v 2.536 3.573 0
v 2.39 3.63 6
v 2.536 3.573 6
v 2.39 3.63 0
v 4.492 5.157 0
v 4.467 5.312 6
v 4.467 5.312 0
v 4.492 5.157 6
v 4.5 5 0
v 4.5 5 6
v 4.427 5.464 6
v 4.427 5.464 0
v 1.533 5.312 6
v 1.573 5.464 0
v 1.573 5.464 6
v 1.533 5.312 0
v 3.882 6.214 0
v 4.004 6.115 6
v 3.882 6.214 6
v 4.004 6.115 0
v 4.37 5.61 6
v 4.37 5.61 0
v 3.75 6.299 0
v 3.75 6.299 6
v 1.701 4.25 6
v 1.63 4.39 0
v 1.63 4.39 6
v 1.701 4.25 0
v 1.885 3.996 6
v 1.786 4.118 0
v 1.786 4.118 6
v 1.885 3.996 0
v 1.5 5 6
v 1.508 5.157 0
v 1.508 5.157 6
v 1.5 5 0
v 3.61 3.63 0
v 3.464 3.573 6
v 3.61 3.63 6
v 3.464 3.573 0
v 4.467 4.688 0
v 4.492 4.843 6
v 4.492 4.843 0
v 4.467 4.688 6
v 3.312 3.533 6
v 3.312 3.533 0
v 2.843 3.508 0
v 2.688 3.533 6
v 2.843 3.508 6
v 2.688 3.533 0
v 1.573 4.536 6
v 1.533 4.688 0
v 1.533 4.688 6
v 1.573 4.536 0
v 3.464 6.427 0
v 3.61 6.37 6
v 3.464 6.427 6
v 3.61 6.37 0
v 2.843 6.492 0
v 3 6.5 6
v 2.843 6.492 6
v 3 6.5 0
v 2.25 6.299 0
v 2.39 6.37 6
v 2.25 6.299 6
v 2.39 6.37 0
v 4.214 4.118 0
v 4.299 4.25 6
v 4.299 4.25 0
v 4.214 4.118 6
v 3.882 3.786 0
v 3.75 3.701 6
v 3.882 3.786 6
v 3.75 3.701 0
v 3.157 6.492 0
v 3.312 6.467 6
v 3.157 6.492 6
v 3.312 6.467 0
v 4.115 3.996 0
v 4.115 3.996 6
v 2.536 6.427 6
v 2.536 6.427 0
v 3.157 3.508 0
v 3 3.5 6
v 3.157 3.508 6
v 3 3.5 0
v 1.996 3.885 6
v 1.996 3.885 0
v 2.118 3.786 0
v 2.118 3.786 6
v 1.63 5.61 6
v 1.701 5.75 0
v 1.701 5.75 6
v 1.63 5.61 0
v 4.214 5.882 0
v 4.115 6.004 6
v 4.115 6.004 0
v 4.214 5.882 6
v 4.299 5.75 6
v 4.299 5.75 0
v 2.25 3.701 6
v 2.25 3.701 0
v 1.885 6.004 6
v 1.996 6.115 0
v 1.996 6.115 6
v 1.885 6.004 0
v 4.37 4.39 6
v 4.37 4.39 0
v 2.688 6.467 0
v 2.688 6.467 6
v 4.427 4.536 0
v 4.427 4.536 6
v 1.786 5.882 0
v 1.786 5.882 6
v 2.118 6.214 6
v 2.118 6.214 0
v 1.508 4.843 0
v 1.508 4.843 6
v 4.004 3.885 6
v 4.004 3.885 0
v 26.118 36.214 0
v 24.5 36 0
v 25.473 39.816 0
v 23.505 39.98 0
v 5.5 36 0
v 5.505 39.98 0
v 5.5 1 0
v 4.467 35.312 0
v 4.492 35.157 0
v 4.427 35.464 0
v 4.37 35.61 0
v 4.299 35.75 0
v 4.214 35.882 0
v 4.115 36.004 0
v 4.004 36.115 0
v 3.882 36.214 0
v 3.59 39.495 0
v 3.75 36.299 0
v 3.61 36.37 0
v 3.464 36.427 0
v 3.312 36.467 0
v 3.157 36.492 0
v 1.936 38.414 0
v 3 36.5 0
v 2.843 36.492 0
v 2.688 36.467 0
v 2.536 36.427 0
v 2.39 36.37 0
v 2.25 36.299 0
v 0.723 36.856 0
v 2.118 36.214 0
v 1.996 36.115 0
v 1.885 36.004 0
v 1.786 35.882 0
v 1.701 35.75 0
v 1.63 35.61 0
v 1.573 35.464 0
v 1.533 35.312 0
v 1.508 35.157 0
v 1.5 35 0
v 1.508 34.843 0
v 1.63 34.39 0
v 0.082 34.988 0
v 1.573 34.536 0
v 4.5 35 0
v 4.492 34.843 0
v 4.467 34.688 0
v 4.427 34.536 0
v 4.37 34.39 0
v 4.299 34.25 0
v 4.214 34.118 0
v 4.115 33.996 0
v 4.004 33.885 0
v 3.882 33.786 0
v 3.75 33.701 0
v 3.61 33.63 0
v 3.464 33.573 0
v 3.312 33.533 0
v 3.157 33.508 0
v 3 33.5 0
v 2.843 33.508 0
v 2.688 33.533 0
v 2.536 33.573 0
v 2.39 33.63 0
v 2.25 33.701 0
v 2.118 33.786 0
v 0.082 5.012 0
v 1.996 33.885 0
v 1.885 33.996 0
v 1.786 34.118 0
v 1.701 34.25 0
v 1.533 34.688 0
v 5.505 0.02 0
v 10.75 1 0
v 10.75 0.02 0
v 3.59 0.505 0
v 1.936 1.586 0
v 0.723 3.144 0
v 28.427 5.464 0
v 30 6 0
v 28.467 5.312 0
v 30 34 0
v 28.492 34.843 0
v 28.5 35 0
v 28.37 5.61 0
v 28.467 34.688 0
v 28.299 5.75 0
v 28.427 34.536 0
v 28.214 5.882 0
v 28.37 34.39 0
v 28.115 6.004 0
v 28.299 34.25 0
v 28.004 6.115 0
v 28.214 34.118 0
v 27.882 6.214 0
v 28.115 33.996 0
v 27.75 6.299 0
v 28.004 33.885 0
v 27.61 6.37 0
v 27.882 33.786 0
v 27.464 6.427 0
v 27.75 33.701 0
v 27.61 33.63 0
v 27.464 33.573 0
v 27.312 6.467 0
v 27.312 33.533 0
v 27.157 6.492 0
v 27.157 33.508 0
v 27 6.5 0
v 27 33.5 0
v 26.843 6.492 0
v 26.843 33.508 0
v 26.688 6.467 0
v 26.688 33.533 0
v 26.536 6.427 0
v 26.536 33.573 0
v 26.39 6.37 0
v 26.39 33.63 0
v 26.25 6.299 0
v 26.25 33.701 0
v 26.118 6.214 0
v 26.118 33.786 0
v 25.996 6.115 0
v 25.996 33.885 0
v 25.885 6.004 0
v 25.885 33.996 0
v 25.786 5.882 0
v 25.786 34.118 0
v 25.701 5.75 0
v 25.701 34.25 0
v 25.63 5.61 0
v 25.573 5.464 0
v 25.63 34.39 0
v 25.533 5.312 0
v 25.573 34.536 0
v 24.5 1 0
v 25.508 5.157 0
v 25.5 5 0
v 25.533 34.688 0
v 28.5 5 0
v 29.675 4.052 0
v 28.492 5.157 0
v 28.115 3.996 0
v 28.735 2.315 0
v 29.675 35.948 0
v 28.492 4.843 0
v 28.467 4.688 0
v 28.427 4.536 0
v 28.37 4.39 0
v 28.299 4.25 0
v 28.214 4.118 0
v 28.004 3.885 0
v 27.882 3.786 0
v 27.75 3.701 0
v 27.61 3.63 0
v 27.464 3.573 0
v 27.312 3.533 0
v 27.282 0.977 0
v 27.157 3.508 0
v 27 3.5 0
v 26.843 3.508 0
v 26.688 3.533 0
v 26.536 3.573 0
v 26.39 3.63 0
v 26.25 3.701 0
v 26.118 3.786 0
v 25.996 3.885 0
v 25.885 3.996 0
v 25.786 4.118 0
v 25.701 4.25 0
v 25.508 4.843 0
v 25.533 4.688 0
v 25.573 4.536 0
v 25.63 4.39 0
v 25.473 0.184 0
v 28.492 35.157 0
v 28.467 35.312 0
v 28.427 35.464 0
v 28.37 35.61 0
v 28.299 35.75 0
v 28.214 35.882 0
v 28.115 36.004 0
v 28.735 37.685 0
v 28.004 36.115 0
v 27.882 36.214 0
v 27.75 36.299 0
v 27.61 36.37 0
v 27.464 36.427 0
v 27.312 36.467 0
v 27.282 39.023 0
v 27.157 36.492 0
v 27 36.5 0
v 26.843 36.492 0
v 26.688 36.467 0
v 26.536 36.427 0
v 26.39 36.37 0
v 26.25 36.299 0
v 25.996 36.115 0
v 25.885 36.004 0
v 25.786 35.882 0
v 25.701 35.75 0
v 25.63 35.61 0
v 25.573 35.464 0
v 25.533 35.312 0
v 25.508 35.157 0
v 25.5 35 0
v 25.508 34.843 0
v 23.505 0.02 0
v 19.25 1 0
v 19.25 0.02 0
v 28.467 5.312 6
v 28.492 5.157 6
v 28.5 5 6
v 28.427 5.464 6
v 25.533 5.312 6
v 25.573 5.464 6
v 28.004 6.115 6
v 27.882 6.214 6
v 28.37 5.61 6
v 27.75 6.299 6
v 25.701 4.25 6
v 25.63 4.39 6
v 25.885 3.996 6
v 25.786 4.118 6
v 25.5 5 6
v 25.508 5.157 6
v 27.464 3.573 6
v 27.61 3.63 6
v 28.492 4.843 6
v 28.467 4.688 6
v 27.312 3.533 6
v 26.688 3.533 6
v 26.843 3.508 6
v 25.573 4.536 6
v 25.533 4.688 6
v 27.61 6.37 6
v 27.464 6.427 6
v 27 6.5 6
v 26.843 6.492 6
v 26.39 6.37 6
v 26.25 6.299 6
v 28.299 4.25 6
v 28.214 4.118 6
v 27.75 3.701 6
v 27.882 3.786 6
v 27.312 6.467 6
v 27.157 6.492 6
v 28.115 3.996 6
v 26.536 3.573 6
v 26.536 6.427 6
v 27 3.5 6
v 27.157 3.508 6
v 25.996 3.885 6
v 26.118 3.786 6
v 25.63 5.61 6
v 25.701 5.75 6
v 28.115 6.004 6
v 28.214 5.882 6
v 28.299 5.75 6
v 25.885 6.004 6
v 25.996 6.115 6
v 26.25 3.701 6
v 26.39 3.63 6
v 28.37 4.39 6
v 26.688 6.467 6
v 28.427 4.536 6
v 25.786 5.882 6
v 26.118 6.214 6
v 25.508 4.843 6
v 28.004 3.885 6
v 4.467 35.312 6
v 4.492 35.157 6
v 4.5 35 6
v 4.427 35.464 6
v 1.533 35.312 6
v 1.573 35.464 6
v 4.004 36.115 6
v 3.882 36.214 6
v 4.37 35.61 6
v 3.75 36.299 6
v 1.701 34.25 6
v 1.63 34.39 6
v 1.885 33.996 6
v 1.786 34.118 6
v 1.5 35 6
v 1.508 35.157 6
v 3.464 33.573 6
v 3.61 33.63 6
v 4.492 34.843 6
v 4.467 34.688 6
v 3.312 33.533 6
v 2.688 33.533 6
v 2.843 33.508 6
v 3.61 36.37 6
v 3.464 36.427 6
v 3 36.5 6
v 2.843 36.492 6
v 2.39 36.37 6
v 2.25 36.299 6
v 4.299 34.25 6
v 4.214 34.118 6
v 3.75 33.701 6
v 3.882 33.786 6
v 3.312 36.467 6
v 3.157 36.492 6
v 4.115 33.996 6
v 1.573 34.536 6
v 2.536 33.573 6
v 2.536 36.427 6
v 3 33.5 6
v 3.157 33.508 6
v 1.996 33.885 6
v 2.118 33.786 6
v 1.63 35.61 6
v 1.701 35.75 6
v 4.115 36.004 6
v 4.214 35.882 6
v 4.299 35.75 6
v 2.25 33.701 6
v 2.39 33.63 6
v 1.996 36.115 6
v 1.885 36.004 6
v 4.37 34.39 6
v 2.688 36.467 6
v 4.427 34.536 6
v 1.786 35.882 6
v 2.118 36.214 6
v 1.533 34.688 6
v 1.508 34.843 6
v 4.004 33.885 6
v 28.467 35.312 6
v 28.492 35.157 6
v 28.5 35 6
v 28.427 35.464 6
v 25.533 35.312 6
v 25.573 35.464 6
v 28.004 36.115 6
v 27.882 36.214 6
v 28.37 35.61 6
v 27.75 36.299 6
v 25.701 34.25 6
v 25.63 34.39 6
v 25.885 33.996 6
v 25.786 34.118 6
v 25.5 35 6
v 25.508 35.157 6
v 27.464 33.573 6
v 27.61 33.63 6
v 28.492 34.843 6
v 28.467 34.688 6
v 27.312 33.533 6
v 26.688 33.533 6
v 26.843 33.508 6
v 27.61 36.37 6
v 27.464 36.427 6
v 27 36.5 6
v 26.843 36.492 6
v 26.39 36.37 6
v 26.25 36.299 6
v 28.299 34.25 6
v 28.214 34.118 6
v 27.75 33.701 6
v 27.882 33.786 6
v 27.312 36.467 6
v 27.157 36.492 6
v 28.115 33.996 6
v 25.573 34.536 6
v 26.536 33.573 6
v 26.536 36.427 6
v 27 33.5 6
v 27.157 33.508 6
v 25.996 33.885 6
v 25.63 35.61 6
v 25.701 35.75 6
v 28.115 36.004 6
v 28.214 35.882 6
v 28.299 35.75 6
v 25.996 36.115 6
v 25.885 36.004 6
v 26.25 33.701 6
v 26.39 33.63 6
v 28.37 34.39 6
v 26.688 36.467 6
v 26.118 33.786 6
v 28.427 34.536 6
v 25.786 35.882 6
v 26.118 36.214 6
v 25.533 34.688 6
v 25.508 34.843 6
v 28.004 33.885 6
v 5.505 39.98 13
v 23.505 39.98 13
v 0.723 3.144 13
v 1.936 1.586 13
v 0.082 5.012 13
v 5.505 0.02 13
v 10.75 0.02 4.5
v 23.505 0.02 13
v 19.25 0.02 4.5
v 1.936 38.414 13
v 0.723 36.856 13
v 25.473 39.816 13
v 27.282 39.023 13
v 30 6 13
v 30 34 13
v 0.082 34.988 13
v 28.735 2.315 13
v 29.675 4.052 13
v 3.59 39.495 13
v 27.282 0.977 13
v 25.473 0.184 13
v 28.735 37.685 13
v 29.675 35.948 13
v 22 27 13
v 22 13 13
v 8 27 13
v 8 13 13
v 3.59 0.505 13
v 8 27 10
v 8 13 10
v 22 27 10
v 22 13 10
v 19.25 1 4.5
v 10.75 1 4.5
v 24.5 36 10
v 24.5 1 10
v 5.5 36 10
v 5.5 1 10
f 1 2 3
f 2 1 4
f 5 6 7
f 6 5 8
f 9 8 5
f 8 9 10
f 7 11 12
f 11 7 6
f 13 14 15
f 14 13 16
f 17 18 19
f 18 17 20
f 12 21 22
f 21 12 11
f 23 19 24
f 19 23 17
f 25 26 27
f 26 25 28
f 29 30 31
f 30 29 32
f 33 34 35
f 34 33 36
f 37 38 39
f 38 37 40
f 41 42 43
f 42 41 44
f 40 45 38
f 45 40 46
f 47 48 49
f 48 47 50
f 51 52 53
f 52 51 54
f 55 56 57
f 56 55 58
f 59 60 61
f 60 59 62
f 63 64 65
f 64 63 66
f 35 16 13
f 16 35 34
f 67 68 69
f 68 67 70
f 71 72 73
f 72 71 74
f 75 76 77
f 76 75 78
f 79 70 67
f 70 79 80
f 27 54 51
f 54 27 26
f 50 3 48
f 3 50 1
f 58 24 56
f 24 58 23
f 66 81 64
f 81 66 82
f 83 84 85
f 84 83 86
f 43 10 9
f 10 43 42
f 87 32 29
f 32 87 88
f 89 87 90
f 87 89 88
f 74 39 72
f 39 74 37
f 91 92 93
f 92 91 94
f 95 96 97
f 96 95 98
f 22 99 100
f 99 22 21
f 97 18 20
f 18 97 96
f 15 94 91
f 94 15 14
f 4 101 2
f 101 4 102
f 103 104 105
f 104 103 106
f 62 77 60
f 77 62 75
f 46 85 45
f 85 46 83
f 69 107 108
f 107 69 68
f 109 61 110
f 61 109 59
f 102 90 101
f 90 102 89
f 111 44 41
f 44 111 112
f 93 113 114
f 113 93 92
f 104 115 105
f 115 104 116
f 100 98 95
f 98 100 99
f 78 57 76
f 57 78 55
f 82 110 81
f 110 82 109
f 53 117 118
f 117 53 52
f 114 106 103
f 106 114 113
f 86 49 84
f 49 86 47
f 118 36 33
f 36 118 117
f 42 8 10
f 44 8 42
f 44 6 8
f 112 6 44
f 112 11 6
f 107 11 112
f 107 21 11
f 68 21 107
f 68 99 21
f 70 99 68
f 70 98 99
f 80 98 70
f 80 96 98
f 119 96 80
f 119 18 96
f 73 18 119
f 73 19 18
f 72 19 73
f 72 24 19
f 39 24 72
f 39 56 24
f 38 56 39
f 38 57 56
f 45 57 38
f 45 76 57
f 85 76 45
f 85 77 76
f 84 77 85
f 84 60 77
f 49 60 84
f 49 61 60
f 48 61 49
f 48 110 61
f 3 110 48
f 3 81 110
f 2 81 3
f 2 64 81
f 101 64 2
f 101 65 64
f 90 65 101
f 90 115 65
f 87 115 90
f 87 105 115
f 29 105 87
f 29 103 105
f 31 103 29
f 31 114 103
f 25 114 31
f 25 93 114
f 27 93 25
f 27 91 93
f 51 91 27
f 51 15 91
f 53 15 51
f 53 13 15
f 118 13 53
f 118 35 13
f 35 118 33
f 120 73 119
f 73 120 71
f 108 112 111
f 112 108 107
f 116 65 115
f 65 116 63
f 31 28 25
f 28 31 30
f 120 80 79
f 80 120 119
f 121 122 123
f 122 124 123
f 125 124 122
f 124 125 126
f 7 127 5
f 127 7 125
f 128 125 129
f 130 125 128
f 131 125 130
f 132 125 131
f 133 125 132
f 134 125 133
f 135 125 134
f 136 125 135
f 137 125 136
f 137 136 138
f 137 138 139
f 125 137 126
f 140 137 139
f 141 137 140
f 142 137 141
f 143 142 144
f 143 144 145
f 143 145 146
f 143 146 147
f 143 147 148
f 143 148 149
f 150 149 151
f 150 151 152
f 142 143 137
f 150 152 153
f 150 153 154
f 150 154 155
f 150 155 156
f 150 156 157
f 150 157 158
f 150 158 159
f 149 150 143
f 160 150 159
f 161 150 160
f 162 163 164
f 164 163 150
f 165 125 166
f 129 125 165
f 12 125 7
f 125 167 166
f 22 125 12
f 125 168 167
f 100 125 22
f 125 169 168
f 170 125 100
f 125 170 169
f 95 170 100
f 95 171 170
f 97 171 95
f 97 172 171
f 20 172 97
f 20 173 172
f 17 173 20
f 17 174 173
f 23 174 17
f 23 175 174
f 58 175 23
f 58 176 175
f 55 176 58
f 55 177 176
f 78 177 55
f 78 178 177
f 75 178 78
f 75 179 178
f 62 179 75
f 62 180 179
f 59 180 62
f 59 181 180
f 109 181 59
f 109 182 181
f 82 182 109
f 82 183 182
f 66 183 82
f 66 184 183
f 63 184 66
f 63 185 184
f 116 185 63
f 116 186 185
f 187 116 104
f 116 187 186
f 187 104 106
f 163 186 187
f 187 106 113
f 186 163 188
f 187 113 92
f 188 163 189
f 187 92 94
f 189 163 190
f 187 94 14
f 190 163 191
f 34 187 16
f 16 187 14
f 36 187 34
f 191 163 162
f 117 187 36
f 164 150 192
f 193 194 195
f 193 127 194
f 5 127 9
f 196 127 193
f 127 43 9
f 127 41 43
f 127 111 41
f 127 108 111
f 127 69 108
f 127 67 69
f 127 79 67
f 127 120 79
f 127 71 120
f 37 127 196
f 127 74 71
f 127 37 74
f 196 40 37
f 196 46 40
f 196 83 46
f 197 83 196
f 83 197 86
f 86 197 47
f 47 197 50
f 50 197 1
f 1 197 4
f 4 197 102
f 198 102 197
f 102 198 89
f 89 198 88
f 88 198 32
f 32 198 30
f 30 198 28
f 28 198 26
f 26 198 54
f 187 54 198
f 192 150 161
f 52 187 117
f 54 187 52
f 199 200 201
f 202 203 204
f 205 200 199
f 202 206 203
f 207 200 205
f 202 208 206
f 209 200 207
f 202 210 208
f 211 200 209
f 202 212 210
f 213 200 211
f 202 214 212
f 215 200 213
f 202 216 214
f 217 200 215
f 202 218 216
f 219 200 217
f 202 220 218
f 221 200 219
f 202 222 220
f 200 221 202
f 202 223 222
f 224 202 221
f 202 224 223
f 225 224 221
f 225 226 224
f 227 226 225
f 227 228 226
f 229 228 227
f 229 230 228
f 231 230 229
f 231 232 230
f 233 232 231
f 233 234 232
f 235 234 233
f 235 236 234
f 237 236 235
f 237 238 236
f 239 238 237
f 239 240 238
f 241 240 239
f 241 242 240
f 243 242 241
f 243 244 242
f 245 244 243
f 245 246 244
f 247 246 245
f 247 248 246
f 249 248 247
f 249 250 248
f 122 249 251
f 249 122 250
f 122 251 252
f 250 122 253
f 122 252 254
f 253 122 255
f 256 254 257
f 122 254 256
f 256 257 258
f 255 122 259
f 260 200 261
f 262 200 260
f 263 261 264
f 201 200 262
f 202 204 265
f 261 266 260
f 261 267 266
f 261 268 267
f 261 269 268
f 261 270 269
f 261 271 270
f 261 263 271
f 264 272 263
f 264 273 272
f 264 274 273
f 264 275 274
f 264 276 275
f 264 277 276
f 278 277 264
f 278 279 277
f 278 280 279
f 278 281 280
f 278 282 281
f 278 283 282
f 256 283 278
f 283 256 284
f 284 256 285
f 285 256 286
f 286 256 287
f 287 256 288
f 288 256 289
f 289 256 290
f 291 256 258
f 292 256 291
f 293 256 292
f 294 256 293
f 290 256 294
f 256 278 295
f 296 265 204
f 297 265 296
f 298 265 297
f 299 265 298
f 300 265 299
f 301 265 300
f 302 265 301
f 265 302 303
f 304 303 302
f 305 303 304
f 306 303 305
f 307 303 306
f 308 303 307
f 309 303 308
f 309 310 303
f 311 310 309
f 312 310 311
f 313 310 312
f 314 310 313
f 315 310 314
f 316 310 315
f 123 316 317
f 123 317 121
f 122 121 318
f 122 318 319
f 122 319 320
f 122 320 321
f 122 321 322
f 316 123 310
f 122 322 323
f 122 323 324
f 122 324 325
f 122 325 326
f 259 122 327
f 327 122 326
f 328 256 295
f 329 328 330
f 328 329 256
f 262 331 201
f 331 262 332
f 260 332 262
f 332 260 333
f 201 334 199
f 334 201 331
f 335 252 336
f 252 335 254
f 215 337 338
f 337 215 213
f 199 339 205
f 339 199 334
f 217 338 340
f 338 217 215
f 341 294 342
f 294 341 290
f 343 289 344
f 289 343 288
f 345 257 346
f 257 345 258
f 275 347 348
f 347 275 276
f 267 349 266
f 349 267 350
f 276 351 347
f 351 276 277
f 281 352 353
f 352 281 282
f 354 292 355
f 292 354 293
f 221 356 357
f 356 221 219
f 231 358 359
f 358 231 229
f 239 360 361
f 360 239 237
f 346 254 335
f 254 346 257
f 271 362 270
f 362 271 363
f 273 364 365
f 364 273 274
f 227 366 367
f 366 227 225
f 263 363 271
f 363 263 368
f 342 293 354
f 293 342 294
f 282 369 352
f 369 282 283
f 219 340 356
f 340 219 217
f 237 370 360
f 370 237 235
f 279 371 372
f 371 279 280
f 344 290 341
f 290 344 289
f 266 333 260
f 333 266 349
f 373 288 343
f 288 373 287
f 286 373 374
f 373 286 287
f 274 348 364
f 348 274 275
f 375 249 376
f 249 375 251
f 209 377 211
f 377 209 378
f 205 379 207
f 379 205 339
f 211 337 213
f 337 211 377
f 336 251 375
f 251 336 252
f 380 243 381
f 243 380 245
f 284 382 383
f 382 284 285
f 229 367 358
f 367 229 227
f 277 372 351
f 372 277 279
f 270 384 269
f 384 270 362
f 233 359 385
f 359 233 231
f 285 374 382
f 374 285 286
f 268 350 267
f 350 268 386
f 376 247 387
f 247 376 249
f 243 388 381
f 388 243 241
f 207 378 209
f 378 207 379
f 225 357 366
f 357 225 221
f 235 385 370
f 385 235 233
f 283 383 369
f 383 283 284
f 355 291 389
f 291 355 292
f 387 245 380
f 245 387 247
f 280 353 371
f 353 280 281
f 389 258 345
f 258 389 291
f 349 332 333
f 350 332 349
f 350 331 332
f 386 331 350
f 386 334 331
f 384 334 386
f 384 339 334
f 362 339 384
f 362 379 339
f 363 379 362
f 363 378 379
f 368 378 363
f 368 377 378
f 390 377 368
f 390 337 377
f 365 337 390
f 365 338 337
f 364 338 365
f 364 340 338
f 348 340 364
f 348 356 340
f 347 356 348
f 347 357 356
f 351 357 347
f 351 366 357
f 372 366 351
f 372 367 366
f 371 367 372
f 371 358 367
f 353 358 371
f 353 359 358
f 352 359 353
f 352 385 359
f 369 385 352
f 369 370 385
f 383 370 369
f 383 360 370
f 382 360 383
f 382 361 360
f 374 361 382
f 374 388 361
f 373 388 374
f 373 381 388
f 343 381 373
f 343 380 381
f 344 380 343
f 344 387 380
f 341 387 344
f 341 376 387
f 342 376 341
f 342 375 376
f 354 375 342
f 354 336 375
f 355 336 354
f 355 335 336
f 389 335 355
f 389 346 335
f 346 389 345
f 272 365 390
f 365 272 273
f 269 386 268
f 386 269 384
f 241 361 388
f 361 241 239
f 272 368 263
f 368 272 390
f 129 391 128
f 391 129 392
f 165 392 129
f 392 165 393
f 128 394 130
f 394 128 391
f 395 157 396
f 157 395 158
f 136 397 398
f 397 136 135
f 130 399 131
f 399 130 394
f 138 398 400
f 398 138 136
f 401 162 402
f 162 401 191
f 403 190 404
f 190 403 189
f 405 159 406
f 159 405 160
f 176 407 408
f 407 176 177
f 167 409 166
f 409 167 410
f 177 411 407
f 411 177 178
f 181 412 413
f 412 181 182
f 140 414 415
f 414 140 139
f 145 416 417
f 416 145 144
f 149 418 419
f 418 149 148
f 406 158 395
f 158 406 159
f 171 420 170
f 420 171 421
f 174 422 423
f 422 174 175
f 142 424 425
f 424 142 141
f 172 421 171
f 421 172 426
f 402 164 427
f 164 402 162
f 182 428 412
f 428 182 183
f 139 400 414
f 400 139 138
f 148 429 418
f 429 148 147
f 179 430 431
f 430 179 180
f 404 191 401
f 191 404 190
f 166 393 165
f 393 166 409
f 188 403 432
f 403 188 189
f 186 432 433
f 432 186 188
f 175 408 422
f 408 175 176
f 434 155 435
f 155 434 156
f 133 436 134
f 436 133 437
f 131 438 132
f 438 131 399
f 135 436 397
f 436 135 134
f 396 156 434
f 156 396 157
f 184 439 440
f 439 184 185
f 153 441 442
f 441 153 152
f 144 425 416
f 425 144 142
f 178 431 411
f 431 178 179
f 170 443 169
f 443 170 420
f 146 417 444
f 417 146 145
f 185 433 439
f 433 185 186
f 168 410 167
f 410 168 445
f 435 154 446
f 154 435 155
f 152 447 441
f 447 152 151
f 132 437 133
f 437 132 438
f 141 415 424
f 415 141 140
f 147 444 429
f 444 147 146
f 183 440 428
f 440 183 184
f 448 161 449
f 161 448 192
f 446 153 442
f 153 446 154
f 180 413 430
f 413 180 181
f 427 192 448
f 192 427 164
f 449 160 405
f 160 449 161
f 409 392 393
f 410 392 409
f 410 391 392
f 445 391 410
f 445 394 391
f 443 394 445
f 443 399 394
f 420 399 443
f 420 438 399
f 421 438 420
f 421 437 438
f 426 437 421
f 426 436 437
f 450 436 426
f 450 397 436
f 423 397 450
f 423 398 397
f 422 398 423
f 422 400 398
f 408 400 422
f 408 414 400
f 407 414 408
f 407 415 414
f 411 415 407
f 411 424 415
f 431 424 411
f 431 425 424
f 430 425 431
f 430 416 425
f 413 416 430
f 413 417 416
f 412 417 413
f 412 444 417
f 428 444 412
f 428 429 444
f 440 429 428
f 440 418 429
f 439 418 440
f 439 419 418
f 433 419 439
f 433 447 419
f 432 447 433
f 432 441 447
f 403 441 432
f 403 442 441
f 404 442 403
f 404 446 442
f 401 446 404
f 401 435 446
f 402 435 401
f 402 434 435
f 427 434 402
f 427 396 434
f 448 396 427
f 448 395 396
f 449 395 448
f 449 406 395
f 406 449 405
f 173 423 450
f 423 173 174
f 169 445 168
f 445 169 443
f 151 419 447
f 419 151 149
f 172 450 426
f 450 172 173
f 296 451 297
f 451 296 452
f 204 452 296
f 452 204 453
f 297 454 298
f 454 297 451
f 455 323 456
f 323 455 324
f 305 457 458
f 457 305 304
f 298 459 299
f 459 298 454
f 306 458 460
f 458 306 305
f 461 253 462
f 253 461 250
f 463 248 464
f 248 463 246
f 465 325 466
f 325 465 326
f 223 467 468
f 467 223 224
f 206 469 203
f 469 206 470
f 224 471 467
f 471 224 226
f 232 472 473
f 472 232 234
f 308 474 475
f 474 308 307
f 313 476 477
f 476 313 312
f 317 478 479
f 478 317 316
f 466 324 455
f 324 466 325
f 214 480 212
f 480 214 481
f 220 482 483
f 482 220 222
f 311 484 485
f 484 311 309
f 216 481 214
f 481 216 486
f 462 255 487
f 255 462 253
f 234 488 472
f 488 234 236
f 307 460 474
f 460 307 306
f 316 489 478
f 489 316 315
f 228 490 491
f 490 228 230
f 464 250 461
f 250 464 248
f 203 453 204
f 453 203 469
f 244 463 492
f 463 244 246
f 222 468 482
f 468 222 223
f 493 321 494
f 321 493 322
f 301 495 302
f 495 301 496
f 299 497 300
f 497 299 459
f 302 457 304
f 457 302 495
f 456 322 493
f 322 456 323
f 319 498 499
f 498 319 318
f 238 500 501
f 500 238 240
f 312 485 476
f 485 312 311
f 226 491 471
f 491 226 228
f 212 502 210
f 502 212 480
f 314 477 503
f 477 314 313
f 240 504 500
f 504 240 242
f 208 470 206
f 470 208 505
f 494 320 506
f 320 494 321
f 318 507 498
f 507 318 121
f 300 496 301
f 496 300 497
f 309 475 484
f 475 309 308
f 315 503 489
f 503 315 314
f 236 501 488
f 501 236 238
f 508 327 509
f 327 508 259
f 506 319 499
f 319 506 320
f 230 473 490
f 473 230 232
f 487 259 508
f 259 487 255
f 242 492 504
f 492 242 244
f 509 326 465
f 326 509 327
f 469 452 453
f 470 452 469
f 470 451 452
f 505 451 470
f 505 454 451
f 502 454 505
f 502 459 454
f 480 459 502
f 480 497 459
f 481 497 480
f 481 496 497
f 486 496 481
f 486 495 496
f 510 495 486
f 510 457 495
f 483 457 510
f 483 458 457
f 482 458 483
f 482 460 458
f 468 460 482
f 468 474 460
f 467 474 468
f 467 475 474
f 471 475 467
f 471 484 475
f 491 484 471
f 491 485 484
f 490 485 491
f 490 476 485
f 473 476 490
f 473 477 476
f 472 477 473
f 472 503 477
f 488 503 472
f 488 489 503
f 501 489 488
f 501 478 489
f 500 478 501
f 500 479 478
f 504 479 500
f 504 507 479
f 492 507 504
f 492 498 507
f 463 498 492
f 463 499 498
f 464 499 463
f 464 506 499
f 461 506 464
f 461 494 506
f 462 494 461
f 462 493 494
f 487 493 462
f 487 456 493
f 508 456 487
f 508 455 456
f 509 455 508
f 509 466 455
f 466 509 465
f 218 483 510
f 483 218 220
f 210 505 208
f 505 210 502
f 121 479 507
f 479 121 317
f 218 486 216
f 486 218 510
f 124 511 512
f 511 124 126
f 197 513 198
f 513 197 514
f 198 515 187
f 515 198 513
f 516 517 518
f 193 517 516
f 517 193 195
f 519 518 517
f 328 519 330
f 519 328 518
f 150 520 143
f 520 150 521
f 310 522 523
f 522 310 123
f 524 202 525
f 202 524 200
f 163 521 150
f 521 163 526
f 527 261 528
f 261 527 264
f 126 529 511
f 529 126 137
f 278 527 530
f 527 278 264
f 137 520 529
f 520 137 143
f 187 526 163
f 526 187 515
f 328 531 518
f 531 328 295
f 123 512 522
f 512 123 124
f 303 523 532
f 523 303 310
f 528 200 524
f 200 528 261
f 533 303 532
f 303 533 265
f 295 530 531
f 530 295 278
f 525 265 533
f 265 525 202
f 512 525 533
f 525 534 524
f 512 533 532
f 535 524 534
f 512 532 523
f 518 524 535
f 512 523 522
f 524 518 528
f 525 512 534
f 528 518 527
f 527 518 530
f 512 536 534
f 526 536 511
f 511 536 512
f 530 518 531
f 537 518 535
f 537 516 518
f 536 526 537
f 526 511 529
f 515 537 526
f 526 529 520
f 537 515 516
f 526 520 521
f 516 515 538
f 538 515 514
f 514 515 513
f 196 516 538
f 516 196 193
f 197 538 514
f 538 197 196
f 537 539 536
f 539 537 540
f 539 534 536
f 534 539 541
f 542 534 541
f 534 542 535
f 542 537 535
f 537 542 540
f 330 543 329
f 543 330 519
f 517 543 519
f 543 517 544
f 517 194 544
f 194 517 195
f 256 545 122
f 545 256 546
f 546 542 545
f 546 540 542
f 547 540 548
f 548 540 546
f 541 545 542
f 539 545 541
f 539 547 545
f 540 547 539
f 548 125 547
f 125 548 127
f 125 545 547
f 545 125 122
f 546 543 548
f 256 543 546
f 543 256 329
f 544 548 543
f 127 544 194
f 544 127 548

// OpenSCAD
//square([19,35]); //approx pro micro dimensions

//OG rickpadd dimensions: 30*40*(2+13)

/*M3 screw dimesions: 
Head diameter = 5.5mm
Head height = 3mm
Screw diameter = 3mm
*/


plateThickness=2;
CaseThickness=13;
width=30;
length=40;
cornerRadius=6;

module Plate(){
    difference(){
        linear_extrude(2){
        hull(){
                translate([cornerRadius,cornerRadius,0])circle(r=cornerRadius);
                translate([width-cornerRadius,cornerRadius,0])circle(r=cornerRadius);
                translate([cornerRadius,length-cornerRadius,0])circle(r=cornerRadius);
                translate([width-cornerRadius,length-cornerRadius,0])circle(r=cornerRadius);
            }
        }
        screwHoles();
    }
}

module Case(){
    difference(){
        
        linear_extrude(13){
            hull(){
                translate([cornerRadius,cornerRadius,0])circle(r=cornerRadius);
                translate([width-cornerRadius,cornerRadius,0])circle(r=cornerRadius);
                translate([cornerRadius,length-cornerRadius,0])circle(r=cornerRadius);
                translate([width-cornerRadius,length-cornerRadius,0])circle(r=cornerRadius);
            }
        }
        translate([width/2,length/2,9])linear_extrude(5)square(14, center = true); //switch hole
        translate([width/2-(8.5/2),-1,0])cube([8.5,10,4.5]);//usb port hole
        translate([width/2-(19/2),1,0])cube([19,35,10]);//hollow inside
        screwHoles();
    }
}

module screwHoles(){
    translate([3,5,0])cylinder(6,1.5,1.5,$fn=60);
    translate([27,5,0])cylinder(6,1.5,1.5,$fn=60);
    translate([3,35,0])cylinder(6,1.5,1.5,$fn=60);
    translate([27,35,0])cylinder(6,1.5,1.5,$fn=60);
}

//Plate();
Case();
